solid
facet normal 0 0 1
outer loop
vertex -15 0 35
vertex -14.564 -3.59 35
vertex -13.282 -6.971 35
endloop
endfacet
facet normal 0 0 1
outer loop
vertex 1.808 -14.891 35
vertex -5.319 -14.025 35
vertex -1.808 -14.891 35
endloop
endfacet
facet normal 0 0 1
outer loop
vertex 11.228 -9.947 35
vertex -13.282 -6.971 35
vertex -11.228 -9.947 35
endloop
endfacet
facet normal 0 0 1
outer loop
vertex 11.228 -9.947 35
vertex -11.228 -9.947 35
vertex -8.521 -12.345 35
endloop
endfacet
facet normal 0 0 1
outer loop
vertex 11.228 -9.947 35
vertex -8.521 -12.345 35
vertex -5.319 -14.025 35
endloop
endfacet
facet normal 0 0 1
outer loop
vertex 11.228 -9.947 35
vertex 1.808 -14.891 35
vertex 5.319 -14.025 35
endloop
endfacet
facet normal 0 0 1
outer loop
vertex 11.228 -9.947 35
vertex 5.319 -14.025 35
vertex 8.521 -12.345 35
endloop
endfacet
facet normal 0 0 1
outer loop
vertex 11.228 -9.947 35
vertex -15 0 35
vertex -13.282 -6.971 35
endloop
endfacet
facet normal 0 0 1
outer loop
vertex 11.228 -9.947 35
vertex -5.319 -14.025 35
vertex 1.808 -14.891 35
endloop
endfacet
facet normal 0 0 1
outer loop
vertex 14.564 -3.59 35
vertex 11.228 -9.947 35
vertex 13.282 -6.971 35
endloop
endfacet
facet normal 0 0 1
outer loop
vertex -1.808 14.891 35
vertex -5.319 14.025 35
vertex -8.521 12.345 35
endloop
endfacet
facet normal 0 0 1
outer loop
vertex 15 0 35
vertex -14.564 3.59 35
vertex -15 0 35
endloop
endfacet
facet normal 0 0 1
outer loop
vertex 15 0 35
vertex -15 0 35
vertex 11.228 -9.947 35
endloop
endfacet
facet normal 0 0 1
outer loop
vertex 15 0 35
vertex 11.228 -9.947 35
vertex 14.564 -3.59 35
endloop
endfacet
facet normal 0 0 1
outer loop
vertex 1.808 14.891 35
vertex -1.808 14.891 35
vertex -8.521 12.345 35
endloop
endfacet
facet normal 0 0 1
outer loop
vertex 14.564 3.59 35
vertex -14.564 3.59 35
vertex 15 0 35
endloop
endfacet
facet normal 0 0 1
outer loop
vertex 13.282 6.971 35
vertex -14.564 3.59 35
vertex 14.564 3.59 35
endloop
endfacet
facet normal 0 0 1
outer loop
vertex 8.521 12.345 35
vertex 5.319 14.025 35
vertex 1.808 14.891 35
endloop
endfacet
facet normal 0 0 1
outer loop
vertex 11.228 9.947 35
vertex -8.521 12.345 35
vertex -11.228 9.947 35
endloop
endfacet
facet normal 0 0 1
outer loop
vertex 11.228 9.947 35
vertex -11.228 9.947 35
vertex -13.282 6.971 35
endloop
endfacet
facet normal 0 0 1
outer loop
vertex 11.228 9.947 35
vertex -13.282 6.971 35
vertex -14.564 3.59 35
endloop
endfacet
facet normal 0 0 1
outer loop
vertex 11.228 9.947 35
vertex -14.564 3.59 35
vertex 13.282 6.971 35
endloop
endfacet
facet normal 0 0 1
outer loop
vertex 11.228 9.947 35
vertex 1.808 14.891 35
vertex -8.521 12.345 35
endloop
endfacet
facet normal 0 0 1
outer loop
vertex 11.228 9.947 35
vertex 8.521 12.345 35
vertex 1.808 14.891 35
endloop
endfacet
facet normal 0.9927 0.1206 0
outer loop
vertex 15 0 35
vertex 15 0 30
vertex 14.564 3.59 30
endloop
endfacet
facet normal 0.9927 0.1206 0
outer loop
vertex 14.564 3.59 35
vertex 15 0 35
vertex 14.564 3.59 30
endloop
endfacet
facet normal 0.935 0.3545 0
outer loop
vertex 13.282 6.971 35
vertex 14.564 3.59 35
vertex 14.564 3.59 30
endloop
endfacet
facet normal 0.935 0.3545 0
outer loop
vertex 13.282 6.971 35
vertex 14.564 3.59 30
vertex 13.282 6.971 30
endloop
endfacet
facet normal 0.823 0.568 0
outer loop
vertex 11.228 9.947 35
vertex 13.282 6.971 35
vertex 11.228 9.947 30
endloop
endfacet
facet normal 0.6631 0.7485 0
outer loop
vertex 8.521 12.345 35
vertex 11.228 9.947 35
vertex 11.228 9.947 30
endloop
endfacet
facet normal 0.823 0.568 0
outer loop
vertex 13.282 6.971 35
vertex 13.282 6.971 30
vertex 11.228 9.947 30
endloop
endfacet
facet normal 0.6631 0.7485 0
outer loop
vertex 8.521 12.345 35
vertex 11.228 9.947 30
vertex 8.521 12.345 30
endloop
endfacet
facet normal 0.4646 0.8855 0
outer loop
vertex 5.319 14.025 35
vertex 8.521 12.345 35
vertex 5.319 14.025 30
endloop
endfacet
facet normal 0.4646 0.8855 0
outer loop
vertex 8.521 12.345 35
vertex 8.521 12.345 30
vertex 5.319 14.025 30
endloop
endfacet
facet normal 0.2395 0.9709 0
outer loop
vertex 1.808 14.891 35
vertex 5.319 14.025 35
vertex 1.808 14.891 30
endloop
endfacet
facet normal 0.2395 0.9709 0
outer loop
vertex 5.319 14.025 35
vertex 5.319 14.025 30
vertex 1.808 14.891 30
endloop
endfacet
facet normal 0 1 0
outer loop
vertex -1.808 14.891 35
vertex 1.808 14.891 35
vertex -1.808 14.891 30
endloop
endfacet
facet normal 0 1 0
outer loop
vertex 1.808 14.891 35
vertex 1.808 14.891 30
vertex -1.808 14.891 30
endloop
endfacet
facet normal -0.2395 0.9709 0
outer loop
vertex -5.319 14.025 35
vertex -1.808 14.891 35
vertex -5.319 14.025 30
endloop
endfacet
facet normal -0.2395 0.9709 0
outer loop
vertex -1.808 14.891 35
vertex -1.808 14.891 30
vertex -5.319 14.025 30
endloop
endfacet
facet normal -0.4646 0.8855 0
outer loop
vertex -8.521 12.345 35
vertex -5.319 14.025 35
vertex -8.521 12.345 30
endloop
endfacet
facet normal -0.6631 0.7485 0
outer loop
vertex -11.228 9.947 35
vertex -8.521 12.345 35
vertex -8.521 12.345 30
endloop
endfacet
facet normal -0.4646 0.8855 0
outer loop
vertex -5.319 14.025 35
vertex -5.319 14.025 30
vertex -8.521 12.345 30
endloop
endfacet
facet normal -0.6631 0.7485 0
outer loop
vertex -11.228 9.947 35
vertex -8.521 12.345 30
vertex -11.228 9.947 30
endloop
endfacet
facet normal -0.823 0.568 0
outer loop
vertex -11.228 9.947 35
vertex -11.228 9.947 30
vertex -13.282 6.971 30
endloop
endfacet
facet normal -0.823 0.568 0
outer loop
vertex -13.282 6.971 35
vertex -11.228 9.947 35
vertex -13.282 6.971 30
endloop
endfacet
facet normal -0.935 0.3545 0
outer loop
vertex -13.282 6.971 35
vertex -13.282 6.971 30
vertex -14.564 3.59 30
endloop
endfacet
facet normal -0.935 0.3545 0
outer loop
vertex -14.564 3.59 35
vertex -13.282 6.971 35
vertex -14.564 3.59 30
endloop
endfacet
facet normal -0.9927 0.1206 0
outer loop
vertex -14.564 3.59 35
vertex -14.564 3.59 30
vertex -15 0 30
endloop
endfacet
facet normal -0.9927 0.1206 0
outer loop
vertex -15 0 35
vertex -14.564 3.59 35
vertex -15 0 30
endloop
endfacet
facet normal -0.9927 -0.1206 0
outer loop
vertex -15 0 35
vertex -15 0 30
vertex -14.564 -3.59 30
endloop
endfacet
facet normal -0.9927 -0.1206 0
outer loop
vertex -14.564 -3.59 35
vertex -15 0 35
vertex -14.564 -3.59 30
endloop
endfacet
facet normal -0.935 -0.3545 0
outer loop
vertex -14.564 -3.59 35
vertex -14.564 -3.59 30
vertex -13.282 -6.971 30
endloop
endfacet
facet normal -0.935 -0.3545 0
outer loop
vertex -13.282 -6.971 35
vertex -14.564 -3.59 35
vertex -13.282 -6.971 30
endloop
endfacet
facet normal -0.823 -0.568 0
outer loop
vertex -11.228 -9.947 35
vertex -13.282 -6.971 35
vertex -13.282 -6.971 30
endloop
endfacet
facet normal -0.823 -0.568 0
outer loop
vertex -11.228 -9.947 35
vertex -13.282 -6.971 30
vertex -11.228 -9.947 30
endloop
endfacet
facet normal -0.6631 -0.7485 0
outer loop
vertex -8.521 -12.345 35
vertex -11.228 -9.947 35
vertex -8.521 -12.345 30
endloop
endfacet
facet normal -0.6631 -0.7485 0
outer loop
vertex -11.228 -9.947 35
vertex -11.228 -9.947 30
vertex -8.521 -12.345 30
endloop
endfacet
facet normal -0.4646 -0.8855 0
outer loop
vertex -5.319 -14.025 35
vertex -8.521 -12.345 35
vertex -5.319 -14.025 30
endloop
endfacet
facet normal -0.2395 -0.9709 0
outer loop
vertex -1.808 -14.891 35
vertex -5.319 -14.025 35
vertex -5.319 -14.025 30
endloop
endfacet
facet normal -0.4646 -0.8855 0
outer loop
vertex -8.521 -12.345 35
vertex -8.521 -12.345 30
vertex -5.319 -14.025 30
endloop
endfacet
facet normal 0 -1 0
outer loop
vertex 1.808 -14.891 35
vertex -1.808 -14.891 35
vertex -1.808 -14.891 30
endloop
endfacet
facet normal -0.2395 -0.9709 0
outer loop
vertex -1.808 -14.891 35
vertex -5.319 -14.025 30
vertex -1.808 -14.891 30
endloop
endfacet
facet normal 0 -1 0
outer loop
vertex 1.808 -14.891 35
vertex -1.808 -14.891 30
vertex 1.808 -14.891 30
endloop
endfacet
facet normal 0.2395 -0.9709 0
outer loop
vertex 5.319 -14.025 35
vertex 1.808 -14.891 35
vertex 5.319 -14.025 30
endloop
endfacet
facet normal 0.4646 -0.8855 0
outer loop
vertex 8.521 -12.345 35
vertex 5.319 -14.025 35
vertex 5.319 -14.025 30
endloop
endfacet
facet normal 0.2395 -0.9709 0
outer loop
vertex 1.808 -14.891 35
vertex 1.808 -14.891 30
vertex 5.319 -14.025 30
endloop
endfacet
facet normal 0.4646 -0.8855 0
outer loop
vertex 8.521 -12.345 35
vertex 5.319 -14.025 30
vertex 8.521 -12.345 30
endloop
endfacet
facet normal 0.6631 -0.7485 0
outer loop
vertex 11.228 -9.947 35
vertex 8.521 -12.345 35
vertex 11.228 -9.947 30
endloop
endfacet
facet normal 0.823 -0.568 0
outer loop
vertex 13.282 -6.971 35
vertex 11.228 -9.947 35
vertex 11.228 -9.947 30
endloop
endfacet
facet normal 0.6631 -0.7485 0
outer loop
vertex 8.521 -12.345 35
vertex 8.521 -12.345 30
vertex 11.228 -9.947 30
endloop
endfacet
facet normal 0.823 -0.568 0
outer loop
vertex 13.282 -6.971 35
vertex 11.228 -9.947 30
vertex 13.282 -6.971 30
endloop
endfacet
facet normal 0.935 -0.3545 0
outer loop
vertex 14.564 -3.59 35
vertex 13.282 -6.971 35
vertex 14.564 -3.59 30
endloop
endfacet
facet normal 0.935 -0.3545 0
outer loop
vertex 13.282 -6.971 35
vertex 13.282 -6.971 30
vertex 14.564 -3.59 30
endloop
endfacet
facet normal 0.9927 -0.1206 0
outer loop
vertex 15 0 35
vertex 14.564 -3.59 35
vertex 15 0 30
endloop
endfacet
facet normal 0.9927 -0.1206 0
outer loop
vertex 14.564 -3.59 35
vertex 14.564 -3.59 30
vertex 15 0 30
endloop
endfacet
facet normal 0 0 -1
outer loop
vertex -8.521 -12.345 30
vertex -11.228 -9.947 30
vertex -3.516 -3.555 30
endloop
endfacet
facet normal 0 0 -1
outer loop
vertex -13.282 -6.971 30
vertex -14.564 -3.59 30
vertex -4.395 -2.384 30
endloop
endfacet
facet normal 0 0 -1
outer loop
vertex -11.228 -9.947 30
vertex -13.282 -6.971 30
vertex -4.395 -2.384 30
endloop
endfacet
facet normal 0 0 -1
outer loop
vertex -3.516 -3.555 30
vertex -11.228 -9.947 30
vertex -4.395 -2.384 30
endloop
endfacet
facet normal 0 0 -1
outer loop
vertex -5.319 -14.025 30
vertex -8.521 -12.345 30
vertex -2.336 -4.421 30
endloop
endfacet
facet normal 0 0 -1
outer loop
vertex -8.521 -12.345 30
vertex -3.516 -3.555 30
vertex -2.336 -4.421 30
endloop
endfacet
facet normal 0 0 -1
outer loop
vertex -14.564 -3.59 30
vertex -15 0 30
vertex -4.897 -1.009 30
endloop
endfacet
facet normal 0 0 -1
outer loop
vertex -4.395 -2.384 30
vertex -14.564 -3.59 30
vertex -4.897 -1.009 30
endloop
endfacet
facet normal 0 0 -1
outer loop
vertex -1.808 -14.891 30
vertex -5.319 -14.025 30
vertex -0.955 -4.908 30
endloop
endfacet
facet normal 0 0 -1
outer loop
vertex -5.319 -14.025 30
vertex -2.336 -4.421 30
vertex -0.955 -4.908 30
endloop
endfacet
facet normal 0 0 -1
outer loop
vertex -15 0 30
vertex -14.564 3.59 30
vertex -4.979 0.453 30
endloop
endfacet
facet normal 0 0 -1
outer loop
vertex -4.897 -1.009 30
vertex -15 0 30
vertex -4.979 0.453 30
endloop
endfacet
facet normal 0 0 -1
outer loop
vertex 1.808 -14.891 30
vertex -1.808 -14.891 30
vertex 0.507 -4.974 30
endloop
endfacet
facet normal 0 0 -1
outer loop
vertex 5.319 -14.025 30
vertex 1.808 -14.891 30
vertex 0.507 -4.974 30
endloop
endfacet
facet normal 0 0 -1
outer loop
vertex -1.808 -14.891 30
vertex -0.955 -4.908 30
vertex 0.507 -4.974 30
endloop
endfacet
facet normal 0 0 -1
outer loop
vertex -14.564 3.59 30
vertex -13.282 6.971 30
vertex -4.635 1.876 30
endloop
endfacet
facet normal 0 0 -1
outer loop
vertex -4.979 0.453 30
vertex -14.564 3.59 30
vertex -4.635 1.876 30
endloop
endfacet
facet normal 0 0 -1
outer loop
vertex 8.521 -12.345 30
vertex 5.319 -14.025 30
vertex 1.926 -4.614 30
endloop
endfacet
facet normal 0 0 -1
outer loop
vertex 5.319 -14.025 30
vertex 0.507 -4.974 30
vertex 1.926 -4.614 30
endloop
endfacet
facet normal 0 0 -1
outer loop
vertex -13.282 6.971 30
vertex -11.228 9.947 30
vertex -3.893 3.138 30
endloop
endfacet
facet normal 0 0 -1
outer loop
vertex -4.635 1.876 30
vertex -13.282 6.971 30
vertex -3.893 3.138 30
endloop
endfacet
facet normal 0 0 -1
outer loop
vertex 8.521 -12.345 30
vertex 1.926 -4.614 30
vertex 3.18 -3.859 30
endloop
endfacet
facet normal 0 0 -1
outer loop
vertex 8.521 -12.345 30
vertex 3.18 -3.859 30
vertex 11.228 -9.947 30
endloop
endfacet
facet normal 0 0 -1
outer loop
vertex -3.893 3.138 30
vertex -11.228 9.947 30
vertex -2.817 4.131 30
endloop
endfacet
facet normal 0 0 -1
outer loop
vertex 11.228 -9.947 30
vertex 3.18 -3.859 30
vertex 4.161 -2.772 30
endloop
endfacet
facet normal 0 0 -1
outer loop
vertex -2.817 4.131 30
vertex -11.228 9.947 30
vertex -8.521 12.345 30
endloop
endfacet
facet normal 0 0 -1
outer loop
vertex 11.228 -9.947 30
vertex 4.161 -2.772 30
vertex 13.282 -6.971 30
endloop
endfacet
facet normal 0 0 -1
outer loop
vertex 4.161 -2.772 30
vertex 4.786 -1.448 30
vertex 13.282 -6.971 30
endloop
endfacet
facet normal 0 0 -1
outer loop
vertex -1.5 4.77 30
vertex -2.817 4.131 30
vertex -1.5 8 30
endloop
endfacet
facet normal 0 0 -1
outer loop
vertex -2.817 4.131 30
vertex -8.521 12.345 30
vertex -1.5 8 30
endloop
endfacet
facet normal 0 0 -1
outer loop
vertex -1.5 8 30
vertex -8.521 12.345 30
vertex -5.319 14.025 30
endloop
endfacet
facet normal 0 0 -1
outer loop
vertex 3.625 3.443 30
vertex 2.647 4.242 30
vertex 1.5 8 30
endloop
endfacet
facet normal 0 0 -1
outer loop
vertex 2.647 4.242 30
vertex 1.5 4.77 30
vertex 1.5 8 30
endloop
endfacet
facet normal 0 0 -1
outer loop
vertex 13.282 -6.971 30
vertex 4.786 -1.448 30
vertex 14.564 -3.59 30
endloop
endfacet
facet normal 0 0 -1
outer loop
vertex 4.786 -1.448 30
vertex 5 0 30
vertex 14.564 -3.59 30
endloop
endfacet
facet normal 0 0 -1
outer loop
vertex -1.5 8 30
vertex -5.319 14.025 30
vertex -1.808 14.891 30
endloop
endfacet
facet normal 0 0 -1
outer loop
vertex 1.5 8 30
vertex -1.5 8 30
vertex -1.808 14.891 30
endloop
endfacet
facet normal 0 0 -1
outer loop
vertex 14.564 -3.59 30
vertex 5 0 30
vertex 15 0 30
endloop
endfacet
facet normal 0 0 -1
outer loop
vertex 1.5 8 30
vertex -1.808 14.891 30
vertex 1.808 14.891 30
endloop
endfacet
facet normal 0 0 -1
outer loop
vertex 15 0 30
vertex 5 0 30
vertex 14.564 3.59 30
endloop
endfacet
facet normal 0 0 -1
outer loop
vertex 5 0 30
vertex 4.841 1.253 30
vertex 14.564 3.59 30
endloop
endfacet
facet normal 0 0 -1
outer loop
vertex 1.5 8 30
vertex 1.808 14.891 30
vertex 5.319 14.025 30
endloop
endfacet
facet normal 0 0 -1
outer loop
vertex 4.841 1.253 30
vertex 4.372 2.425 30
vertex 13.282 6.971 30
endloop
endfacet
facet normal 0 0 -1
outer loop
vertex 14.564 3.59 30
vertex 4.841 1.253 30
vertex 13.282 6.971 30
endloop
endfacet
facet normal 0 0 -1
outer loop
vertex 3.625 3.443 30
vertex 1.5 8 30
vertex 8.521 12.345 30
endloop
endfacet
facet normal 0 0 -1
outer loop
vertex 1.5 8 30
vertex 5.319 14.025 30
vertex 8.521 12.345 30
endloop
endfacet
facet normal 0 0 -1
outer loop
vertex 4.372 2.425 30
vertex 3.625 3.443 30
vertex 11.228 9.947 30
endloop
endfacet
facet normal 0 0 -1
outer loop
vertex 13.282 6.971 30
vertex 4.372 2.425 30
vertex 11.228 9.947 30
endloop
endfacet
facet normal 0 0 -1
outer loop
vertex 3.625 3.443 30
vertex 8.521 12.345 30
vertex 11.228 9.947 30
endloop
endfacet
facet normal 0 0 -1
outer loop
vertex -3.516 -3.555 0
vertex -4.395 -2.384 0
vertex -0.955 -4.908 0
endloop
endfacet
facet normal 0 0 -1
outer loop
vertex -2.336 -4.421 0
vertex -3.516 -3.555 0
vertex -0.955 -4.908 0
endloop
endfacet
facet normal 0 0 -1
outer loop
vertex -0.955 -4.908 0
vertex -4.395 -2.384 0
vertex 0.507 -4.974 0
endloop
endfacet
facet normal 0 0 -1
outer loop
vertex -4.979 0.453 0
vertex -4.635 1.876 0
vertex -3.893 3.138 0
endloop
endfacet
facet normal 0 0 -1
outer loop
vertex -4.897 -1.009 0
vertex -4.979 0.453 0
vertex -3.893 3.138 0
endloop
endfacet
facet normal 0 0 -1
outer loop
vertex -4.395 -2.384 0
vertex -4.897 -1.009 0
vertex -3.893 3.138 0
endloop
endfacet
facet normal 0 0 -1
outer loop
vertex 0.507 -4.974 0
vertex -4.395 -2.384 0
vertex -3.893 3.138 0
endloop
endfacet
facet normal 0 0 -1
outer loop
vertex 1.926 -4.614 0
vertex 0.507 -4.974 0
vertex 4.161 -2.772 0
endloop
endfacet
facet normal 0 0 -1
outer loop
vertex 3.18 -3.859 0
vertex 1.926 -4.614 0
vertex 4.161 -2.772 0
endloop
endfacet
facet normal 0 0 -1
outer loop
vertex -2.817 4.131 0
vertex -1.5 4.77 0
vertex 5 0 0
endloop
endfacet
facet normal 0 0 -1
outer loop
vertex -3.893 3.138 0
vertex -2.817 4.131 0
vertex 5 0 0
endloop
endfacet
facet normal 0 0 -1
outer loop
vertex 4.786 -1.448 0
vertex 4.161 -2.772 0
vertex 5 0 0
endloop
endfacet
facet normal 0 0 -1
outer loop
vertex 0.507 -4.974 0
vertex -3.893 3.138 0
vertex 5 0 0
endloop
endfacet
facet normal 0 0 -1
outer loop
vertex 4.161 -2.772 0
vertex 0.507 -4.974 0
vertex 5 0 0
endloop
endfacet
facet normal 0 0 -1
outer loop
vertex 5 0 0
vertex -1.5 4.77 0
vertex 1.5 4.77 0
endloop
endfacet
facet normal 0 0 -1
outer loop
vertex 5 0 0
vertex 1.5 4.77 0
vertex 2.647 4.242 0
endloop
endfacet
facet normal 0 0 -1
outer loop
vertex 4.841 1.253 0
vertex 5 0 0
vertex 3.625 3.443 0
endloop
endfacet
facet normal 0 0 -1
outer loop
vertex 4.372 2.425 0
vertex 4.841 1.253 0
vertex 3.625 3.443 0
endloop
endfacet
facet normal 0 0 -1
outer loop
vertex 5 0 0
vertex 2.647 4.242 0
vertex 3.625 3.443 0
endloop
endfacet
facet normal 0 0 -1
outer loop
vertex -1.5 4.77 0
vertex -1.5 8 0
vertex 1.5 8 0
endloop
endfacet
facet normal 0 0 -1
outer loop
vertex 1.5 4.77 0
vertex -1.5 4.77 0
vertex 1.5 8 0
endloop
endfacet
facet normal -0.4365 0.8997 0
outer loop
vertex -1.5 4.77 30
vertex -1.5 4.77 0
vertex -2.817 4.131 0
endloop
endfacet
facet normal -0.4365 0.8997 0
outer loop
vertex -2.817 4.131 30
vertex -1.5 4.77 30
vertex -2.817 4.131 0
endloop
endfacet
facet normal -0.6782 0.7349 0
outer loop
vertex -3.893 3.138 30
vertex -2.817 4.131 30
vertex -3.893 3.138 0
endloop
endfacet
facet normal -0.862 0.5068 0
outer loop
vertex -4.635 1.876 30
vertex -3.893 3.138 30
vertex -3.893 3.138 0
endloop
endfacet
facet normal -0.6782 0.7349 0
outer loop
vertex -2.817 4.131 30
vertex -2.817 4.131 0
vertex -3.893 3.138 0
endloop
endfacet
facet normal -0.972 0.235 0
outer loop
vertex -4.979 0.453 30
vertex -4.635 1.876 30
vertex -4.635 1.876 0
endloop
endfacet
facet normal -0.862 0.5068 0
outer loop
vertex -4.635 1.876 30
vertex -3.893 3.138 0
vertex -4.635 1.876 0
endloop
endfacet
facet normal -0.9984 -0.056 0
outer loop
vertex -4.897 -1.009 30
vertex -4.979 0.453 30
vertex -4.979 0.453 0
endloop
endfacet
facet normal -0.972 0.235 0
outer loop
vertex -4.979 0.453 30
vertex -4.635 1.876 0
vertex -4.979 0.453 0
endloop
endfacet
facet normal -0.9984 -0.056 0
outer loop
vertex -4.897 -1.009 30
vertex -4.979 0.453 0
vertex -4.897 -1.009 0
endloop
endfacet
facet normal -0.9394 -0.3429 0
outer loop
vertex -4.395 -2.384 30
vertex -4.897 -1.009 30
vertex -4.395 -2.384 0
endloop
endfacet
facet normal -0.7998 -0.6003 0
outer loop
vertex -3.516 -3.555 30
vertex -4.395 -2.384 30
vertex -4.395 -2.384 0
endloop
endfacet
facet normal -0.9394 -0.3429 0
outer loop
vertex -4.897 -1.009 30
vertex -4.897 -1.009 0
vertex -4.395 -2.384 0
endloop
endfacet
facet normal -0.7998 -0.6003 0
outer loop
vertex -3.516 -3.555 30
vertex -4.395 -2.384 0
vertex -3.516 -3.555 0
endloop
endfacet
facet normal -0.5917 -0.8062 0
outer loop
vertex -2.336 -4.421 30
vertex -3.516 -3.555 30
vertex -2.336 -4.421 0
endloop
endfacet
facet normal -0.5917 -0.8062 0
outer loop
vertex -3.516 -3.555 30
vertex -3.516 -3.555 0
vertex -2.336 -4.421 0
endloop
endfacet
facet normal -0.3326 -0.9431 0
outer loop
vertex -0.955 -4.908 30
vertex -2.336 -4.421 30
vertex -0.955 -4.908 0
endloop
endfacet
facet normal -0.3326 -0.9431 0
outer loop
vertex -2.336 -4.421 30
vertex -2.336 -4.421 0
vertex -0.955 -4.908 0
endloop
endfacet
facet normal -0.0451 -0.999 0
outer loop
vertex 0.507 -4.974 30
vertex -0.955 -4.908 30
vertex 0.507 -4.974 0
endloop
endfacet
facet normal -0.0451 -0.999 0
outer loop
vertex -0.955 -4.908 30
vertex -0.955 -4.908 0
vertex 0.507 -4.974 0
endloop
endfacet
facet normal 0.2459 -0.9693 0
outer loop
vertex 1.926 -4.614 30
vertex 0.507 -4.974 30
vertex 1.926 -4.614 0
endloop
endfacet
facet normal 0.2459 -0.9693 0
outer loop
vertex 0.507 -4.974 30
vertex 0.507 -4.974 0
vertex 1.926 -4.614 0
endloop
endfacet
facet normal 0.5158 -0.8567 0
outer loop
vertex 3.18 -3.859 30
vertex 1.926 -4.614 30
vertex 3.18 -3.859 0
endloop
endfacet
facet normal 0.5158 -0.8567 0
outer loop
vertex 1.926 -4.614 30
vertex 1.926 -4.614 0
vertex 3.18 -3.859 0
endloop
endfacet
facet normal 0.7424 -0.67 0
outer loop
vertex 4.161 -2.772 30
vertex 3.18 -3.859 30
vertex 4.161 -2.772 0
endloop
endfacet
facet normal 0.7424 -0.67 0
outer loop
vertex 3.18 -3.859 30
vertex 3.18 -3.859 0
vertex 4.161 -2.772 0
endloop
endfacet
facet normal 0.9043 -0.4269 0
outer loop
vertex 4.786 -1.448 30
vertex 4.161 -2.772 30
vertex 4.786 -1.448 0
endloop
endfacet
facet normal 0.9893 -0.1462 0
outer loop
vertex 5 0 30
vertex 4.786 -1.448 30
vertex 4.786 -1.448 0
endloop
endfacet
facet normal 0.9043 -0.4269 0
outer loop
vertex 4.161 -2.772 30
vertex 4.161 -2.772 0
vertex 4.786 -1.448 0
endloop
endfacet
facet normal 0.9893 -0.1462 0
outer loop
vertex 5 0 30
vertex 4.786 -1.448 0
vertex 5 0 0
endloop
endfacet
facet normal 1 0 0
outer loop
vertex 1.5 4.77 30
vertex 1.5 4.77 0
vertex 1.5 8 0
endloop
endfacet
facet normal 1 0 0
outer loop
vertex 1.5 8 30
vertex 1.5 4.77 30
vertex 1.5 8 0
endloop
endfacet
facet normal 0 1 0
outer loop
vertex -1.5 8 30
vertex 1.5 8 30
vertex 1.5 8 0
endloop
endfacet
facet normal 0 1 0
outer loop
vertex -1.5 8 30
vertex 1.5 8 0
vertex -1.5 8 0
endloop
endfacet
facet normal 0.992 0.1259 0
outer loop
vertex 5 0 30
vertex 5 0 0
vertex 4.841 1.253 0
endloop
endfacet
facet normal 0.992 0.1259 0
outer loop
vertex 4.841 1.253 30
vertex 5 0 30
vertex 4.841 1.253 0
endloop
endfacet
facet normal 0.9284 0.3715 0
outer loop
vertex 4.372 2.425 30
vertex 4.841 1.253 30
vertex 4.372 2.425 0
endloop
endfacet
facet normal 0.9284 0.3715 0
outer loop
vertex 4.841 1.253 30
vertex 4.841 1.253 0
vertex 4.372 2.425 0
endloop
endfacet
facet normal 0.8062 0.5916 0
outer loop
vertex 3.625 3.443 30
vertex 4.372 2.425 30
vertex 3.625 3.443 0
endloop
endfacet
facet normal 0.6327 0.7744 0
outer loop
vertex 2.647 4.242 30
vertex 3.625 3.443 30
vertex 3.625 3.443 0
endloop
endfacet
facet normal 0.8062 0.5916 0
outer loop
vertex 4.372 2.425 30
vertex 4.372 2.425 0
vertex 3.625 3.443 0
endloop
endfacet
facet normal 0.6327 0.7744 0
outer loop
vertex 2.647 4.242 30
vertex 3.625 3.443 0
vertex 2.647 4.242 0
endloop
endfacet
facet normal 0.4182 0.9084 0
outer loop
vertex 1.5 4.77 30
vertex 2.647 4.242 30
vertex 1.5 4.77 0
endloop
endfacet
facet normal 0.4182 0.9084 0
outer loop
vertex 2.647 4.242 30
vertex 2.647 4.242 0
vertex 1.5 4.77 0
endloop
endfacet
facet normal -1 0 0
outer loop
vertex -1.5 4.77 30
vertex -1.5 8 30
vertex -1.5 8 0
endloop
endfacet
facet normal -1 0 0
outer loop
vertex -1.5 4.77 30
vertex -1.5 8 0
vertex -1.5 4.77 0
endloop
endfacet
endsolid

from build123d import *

# Parameters (mm, degrees)
EXTRUDE_1_DEPTH = 30
SKETCH_2_R      = 15
EXTRUDE_2_DEPTH = 5


with BuildPart() as part:
    # 草图1 → 凸台-拉伸1 (new body)
    with BuildSketch(Plane.XY):
        with BuildLine():
            Line((-1.5, 8), (-1.5, 4.769696007))
            ThreePointArc((-1.5, 4.769696007), (0, 5), (1.5, 4.769696007))
            Line((1.5, 4.769696007), (1.5, 8))
            Line((1.5, 8), (-1.5, 8))
        make_face()
        with BuildLine():
            Line((1.5, 0), (0, 0))
            Line((0, 0), (-1.5, 0))
            Line((-1.5, 0), (-1.5, 4.769696007))
            ThreePointArc((-1.5, 4.769696007), (-2.958039892, -4.031128874), (5, 0))
            ThreePointArc((5, 0), (4.031128874, 2.958039892), (1.5, 4.769696007))
            Line((1.5, 4.769696007), (1.5, 0))
        make_face()
        with BuildLine():
            Line((-1.5, 0), (0, 0))
            Line((0, 0), (1.5, 0))
            Line((1.5, 0), (1.5, 4.769696007))
            ThreePointArc((1.5, 4.769696007), (0, 5), (-1.5, 4.769696007))
            Line((-1.5, 4.769696007), (-1.5, 0))
        make_face()
    extrude(amount=EXTRUDE_1_DEPTH)

    # 草图2 → 凸台-拉伸2 (add)
    with BuildSketch(Plane.XY.offset(30)):
        Circle(SKETCH_2_R)
    extrude(amount=EXTRUDE_2_DEPTH)


solid = part.part
